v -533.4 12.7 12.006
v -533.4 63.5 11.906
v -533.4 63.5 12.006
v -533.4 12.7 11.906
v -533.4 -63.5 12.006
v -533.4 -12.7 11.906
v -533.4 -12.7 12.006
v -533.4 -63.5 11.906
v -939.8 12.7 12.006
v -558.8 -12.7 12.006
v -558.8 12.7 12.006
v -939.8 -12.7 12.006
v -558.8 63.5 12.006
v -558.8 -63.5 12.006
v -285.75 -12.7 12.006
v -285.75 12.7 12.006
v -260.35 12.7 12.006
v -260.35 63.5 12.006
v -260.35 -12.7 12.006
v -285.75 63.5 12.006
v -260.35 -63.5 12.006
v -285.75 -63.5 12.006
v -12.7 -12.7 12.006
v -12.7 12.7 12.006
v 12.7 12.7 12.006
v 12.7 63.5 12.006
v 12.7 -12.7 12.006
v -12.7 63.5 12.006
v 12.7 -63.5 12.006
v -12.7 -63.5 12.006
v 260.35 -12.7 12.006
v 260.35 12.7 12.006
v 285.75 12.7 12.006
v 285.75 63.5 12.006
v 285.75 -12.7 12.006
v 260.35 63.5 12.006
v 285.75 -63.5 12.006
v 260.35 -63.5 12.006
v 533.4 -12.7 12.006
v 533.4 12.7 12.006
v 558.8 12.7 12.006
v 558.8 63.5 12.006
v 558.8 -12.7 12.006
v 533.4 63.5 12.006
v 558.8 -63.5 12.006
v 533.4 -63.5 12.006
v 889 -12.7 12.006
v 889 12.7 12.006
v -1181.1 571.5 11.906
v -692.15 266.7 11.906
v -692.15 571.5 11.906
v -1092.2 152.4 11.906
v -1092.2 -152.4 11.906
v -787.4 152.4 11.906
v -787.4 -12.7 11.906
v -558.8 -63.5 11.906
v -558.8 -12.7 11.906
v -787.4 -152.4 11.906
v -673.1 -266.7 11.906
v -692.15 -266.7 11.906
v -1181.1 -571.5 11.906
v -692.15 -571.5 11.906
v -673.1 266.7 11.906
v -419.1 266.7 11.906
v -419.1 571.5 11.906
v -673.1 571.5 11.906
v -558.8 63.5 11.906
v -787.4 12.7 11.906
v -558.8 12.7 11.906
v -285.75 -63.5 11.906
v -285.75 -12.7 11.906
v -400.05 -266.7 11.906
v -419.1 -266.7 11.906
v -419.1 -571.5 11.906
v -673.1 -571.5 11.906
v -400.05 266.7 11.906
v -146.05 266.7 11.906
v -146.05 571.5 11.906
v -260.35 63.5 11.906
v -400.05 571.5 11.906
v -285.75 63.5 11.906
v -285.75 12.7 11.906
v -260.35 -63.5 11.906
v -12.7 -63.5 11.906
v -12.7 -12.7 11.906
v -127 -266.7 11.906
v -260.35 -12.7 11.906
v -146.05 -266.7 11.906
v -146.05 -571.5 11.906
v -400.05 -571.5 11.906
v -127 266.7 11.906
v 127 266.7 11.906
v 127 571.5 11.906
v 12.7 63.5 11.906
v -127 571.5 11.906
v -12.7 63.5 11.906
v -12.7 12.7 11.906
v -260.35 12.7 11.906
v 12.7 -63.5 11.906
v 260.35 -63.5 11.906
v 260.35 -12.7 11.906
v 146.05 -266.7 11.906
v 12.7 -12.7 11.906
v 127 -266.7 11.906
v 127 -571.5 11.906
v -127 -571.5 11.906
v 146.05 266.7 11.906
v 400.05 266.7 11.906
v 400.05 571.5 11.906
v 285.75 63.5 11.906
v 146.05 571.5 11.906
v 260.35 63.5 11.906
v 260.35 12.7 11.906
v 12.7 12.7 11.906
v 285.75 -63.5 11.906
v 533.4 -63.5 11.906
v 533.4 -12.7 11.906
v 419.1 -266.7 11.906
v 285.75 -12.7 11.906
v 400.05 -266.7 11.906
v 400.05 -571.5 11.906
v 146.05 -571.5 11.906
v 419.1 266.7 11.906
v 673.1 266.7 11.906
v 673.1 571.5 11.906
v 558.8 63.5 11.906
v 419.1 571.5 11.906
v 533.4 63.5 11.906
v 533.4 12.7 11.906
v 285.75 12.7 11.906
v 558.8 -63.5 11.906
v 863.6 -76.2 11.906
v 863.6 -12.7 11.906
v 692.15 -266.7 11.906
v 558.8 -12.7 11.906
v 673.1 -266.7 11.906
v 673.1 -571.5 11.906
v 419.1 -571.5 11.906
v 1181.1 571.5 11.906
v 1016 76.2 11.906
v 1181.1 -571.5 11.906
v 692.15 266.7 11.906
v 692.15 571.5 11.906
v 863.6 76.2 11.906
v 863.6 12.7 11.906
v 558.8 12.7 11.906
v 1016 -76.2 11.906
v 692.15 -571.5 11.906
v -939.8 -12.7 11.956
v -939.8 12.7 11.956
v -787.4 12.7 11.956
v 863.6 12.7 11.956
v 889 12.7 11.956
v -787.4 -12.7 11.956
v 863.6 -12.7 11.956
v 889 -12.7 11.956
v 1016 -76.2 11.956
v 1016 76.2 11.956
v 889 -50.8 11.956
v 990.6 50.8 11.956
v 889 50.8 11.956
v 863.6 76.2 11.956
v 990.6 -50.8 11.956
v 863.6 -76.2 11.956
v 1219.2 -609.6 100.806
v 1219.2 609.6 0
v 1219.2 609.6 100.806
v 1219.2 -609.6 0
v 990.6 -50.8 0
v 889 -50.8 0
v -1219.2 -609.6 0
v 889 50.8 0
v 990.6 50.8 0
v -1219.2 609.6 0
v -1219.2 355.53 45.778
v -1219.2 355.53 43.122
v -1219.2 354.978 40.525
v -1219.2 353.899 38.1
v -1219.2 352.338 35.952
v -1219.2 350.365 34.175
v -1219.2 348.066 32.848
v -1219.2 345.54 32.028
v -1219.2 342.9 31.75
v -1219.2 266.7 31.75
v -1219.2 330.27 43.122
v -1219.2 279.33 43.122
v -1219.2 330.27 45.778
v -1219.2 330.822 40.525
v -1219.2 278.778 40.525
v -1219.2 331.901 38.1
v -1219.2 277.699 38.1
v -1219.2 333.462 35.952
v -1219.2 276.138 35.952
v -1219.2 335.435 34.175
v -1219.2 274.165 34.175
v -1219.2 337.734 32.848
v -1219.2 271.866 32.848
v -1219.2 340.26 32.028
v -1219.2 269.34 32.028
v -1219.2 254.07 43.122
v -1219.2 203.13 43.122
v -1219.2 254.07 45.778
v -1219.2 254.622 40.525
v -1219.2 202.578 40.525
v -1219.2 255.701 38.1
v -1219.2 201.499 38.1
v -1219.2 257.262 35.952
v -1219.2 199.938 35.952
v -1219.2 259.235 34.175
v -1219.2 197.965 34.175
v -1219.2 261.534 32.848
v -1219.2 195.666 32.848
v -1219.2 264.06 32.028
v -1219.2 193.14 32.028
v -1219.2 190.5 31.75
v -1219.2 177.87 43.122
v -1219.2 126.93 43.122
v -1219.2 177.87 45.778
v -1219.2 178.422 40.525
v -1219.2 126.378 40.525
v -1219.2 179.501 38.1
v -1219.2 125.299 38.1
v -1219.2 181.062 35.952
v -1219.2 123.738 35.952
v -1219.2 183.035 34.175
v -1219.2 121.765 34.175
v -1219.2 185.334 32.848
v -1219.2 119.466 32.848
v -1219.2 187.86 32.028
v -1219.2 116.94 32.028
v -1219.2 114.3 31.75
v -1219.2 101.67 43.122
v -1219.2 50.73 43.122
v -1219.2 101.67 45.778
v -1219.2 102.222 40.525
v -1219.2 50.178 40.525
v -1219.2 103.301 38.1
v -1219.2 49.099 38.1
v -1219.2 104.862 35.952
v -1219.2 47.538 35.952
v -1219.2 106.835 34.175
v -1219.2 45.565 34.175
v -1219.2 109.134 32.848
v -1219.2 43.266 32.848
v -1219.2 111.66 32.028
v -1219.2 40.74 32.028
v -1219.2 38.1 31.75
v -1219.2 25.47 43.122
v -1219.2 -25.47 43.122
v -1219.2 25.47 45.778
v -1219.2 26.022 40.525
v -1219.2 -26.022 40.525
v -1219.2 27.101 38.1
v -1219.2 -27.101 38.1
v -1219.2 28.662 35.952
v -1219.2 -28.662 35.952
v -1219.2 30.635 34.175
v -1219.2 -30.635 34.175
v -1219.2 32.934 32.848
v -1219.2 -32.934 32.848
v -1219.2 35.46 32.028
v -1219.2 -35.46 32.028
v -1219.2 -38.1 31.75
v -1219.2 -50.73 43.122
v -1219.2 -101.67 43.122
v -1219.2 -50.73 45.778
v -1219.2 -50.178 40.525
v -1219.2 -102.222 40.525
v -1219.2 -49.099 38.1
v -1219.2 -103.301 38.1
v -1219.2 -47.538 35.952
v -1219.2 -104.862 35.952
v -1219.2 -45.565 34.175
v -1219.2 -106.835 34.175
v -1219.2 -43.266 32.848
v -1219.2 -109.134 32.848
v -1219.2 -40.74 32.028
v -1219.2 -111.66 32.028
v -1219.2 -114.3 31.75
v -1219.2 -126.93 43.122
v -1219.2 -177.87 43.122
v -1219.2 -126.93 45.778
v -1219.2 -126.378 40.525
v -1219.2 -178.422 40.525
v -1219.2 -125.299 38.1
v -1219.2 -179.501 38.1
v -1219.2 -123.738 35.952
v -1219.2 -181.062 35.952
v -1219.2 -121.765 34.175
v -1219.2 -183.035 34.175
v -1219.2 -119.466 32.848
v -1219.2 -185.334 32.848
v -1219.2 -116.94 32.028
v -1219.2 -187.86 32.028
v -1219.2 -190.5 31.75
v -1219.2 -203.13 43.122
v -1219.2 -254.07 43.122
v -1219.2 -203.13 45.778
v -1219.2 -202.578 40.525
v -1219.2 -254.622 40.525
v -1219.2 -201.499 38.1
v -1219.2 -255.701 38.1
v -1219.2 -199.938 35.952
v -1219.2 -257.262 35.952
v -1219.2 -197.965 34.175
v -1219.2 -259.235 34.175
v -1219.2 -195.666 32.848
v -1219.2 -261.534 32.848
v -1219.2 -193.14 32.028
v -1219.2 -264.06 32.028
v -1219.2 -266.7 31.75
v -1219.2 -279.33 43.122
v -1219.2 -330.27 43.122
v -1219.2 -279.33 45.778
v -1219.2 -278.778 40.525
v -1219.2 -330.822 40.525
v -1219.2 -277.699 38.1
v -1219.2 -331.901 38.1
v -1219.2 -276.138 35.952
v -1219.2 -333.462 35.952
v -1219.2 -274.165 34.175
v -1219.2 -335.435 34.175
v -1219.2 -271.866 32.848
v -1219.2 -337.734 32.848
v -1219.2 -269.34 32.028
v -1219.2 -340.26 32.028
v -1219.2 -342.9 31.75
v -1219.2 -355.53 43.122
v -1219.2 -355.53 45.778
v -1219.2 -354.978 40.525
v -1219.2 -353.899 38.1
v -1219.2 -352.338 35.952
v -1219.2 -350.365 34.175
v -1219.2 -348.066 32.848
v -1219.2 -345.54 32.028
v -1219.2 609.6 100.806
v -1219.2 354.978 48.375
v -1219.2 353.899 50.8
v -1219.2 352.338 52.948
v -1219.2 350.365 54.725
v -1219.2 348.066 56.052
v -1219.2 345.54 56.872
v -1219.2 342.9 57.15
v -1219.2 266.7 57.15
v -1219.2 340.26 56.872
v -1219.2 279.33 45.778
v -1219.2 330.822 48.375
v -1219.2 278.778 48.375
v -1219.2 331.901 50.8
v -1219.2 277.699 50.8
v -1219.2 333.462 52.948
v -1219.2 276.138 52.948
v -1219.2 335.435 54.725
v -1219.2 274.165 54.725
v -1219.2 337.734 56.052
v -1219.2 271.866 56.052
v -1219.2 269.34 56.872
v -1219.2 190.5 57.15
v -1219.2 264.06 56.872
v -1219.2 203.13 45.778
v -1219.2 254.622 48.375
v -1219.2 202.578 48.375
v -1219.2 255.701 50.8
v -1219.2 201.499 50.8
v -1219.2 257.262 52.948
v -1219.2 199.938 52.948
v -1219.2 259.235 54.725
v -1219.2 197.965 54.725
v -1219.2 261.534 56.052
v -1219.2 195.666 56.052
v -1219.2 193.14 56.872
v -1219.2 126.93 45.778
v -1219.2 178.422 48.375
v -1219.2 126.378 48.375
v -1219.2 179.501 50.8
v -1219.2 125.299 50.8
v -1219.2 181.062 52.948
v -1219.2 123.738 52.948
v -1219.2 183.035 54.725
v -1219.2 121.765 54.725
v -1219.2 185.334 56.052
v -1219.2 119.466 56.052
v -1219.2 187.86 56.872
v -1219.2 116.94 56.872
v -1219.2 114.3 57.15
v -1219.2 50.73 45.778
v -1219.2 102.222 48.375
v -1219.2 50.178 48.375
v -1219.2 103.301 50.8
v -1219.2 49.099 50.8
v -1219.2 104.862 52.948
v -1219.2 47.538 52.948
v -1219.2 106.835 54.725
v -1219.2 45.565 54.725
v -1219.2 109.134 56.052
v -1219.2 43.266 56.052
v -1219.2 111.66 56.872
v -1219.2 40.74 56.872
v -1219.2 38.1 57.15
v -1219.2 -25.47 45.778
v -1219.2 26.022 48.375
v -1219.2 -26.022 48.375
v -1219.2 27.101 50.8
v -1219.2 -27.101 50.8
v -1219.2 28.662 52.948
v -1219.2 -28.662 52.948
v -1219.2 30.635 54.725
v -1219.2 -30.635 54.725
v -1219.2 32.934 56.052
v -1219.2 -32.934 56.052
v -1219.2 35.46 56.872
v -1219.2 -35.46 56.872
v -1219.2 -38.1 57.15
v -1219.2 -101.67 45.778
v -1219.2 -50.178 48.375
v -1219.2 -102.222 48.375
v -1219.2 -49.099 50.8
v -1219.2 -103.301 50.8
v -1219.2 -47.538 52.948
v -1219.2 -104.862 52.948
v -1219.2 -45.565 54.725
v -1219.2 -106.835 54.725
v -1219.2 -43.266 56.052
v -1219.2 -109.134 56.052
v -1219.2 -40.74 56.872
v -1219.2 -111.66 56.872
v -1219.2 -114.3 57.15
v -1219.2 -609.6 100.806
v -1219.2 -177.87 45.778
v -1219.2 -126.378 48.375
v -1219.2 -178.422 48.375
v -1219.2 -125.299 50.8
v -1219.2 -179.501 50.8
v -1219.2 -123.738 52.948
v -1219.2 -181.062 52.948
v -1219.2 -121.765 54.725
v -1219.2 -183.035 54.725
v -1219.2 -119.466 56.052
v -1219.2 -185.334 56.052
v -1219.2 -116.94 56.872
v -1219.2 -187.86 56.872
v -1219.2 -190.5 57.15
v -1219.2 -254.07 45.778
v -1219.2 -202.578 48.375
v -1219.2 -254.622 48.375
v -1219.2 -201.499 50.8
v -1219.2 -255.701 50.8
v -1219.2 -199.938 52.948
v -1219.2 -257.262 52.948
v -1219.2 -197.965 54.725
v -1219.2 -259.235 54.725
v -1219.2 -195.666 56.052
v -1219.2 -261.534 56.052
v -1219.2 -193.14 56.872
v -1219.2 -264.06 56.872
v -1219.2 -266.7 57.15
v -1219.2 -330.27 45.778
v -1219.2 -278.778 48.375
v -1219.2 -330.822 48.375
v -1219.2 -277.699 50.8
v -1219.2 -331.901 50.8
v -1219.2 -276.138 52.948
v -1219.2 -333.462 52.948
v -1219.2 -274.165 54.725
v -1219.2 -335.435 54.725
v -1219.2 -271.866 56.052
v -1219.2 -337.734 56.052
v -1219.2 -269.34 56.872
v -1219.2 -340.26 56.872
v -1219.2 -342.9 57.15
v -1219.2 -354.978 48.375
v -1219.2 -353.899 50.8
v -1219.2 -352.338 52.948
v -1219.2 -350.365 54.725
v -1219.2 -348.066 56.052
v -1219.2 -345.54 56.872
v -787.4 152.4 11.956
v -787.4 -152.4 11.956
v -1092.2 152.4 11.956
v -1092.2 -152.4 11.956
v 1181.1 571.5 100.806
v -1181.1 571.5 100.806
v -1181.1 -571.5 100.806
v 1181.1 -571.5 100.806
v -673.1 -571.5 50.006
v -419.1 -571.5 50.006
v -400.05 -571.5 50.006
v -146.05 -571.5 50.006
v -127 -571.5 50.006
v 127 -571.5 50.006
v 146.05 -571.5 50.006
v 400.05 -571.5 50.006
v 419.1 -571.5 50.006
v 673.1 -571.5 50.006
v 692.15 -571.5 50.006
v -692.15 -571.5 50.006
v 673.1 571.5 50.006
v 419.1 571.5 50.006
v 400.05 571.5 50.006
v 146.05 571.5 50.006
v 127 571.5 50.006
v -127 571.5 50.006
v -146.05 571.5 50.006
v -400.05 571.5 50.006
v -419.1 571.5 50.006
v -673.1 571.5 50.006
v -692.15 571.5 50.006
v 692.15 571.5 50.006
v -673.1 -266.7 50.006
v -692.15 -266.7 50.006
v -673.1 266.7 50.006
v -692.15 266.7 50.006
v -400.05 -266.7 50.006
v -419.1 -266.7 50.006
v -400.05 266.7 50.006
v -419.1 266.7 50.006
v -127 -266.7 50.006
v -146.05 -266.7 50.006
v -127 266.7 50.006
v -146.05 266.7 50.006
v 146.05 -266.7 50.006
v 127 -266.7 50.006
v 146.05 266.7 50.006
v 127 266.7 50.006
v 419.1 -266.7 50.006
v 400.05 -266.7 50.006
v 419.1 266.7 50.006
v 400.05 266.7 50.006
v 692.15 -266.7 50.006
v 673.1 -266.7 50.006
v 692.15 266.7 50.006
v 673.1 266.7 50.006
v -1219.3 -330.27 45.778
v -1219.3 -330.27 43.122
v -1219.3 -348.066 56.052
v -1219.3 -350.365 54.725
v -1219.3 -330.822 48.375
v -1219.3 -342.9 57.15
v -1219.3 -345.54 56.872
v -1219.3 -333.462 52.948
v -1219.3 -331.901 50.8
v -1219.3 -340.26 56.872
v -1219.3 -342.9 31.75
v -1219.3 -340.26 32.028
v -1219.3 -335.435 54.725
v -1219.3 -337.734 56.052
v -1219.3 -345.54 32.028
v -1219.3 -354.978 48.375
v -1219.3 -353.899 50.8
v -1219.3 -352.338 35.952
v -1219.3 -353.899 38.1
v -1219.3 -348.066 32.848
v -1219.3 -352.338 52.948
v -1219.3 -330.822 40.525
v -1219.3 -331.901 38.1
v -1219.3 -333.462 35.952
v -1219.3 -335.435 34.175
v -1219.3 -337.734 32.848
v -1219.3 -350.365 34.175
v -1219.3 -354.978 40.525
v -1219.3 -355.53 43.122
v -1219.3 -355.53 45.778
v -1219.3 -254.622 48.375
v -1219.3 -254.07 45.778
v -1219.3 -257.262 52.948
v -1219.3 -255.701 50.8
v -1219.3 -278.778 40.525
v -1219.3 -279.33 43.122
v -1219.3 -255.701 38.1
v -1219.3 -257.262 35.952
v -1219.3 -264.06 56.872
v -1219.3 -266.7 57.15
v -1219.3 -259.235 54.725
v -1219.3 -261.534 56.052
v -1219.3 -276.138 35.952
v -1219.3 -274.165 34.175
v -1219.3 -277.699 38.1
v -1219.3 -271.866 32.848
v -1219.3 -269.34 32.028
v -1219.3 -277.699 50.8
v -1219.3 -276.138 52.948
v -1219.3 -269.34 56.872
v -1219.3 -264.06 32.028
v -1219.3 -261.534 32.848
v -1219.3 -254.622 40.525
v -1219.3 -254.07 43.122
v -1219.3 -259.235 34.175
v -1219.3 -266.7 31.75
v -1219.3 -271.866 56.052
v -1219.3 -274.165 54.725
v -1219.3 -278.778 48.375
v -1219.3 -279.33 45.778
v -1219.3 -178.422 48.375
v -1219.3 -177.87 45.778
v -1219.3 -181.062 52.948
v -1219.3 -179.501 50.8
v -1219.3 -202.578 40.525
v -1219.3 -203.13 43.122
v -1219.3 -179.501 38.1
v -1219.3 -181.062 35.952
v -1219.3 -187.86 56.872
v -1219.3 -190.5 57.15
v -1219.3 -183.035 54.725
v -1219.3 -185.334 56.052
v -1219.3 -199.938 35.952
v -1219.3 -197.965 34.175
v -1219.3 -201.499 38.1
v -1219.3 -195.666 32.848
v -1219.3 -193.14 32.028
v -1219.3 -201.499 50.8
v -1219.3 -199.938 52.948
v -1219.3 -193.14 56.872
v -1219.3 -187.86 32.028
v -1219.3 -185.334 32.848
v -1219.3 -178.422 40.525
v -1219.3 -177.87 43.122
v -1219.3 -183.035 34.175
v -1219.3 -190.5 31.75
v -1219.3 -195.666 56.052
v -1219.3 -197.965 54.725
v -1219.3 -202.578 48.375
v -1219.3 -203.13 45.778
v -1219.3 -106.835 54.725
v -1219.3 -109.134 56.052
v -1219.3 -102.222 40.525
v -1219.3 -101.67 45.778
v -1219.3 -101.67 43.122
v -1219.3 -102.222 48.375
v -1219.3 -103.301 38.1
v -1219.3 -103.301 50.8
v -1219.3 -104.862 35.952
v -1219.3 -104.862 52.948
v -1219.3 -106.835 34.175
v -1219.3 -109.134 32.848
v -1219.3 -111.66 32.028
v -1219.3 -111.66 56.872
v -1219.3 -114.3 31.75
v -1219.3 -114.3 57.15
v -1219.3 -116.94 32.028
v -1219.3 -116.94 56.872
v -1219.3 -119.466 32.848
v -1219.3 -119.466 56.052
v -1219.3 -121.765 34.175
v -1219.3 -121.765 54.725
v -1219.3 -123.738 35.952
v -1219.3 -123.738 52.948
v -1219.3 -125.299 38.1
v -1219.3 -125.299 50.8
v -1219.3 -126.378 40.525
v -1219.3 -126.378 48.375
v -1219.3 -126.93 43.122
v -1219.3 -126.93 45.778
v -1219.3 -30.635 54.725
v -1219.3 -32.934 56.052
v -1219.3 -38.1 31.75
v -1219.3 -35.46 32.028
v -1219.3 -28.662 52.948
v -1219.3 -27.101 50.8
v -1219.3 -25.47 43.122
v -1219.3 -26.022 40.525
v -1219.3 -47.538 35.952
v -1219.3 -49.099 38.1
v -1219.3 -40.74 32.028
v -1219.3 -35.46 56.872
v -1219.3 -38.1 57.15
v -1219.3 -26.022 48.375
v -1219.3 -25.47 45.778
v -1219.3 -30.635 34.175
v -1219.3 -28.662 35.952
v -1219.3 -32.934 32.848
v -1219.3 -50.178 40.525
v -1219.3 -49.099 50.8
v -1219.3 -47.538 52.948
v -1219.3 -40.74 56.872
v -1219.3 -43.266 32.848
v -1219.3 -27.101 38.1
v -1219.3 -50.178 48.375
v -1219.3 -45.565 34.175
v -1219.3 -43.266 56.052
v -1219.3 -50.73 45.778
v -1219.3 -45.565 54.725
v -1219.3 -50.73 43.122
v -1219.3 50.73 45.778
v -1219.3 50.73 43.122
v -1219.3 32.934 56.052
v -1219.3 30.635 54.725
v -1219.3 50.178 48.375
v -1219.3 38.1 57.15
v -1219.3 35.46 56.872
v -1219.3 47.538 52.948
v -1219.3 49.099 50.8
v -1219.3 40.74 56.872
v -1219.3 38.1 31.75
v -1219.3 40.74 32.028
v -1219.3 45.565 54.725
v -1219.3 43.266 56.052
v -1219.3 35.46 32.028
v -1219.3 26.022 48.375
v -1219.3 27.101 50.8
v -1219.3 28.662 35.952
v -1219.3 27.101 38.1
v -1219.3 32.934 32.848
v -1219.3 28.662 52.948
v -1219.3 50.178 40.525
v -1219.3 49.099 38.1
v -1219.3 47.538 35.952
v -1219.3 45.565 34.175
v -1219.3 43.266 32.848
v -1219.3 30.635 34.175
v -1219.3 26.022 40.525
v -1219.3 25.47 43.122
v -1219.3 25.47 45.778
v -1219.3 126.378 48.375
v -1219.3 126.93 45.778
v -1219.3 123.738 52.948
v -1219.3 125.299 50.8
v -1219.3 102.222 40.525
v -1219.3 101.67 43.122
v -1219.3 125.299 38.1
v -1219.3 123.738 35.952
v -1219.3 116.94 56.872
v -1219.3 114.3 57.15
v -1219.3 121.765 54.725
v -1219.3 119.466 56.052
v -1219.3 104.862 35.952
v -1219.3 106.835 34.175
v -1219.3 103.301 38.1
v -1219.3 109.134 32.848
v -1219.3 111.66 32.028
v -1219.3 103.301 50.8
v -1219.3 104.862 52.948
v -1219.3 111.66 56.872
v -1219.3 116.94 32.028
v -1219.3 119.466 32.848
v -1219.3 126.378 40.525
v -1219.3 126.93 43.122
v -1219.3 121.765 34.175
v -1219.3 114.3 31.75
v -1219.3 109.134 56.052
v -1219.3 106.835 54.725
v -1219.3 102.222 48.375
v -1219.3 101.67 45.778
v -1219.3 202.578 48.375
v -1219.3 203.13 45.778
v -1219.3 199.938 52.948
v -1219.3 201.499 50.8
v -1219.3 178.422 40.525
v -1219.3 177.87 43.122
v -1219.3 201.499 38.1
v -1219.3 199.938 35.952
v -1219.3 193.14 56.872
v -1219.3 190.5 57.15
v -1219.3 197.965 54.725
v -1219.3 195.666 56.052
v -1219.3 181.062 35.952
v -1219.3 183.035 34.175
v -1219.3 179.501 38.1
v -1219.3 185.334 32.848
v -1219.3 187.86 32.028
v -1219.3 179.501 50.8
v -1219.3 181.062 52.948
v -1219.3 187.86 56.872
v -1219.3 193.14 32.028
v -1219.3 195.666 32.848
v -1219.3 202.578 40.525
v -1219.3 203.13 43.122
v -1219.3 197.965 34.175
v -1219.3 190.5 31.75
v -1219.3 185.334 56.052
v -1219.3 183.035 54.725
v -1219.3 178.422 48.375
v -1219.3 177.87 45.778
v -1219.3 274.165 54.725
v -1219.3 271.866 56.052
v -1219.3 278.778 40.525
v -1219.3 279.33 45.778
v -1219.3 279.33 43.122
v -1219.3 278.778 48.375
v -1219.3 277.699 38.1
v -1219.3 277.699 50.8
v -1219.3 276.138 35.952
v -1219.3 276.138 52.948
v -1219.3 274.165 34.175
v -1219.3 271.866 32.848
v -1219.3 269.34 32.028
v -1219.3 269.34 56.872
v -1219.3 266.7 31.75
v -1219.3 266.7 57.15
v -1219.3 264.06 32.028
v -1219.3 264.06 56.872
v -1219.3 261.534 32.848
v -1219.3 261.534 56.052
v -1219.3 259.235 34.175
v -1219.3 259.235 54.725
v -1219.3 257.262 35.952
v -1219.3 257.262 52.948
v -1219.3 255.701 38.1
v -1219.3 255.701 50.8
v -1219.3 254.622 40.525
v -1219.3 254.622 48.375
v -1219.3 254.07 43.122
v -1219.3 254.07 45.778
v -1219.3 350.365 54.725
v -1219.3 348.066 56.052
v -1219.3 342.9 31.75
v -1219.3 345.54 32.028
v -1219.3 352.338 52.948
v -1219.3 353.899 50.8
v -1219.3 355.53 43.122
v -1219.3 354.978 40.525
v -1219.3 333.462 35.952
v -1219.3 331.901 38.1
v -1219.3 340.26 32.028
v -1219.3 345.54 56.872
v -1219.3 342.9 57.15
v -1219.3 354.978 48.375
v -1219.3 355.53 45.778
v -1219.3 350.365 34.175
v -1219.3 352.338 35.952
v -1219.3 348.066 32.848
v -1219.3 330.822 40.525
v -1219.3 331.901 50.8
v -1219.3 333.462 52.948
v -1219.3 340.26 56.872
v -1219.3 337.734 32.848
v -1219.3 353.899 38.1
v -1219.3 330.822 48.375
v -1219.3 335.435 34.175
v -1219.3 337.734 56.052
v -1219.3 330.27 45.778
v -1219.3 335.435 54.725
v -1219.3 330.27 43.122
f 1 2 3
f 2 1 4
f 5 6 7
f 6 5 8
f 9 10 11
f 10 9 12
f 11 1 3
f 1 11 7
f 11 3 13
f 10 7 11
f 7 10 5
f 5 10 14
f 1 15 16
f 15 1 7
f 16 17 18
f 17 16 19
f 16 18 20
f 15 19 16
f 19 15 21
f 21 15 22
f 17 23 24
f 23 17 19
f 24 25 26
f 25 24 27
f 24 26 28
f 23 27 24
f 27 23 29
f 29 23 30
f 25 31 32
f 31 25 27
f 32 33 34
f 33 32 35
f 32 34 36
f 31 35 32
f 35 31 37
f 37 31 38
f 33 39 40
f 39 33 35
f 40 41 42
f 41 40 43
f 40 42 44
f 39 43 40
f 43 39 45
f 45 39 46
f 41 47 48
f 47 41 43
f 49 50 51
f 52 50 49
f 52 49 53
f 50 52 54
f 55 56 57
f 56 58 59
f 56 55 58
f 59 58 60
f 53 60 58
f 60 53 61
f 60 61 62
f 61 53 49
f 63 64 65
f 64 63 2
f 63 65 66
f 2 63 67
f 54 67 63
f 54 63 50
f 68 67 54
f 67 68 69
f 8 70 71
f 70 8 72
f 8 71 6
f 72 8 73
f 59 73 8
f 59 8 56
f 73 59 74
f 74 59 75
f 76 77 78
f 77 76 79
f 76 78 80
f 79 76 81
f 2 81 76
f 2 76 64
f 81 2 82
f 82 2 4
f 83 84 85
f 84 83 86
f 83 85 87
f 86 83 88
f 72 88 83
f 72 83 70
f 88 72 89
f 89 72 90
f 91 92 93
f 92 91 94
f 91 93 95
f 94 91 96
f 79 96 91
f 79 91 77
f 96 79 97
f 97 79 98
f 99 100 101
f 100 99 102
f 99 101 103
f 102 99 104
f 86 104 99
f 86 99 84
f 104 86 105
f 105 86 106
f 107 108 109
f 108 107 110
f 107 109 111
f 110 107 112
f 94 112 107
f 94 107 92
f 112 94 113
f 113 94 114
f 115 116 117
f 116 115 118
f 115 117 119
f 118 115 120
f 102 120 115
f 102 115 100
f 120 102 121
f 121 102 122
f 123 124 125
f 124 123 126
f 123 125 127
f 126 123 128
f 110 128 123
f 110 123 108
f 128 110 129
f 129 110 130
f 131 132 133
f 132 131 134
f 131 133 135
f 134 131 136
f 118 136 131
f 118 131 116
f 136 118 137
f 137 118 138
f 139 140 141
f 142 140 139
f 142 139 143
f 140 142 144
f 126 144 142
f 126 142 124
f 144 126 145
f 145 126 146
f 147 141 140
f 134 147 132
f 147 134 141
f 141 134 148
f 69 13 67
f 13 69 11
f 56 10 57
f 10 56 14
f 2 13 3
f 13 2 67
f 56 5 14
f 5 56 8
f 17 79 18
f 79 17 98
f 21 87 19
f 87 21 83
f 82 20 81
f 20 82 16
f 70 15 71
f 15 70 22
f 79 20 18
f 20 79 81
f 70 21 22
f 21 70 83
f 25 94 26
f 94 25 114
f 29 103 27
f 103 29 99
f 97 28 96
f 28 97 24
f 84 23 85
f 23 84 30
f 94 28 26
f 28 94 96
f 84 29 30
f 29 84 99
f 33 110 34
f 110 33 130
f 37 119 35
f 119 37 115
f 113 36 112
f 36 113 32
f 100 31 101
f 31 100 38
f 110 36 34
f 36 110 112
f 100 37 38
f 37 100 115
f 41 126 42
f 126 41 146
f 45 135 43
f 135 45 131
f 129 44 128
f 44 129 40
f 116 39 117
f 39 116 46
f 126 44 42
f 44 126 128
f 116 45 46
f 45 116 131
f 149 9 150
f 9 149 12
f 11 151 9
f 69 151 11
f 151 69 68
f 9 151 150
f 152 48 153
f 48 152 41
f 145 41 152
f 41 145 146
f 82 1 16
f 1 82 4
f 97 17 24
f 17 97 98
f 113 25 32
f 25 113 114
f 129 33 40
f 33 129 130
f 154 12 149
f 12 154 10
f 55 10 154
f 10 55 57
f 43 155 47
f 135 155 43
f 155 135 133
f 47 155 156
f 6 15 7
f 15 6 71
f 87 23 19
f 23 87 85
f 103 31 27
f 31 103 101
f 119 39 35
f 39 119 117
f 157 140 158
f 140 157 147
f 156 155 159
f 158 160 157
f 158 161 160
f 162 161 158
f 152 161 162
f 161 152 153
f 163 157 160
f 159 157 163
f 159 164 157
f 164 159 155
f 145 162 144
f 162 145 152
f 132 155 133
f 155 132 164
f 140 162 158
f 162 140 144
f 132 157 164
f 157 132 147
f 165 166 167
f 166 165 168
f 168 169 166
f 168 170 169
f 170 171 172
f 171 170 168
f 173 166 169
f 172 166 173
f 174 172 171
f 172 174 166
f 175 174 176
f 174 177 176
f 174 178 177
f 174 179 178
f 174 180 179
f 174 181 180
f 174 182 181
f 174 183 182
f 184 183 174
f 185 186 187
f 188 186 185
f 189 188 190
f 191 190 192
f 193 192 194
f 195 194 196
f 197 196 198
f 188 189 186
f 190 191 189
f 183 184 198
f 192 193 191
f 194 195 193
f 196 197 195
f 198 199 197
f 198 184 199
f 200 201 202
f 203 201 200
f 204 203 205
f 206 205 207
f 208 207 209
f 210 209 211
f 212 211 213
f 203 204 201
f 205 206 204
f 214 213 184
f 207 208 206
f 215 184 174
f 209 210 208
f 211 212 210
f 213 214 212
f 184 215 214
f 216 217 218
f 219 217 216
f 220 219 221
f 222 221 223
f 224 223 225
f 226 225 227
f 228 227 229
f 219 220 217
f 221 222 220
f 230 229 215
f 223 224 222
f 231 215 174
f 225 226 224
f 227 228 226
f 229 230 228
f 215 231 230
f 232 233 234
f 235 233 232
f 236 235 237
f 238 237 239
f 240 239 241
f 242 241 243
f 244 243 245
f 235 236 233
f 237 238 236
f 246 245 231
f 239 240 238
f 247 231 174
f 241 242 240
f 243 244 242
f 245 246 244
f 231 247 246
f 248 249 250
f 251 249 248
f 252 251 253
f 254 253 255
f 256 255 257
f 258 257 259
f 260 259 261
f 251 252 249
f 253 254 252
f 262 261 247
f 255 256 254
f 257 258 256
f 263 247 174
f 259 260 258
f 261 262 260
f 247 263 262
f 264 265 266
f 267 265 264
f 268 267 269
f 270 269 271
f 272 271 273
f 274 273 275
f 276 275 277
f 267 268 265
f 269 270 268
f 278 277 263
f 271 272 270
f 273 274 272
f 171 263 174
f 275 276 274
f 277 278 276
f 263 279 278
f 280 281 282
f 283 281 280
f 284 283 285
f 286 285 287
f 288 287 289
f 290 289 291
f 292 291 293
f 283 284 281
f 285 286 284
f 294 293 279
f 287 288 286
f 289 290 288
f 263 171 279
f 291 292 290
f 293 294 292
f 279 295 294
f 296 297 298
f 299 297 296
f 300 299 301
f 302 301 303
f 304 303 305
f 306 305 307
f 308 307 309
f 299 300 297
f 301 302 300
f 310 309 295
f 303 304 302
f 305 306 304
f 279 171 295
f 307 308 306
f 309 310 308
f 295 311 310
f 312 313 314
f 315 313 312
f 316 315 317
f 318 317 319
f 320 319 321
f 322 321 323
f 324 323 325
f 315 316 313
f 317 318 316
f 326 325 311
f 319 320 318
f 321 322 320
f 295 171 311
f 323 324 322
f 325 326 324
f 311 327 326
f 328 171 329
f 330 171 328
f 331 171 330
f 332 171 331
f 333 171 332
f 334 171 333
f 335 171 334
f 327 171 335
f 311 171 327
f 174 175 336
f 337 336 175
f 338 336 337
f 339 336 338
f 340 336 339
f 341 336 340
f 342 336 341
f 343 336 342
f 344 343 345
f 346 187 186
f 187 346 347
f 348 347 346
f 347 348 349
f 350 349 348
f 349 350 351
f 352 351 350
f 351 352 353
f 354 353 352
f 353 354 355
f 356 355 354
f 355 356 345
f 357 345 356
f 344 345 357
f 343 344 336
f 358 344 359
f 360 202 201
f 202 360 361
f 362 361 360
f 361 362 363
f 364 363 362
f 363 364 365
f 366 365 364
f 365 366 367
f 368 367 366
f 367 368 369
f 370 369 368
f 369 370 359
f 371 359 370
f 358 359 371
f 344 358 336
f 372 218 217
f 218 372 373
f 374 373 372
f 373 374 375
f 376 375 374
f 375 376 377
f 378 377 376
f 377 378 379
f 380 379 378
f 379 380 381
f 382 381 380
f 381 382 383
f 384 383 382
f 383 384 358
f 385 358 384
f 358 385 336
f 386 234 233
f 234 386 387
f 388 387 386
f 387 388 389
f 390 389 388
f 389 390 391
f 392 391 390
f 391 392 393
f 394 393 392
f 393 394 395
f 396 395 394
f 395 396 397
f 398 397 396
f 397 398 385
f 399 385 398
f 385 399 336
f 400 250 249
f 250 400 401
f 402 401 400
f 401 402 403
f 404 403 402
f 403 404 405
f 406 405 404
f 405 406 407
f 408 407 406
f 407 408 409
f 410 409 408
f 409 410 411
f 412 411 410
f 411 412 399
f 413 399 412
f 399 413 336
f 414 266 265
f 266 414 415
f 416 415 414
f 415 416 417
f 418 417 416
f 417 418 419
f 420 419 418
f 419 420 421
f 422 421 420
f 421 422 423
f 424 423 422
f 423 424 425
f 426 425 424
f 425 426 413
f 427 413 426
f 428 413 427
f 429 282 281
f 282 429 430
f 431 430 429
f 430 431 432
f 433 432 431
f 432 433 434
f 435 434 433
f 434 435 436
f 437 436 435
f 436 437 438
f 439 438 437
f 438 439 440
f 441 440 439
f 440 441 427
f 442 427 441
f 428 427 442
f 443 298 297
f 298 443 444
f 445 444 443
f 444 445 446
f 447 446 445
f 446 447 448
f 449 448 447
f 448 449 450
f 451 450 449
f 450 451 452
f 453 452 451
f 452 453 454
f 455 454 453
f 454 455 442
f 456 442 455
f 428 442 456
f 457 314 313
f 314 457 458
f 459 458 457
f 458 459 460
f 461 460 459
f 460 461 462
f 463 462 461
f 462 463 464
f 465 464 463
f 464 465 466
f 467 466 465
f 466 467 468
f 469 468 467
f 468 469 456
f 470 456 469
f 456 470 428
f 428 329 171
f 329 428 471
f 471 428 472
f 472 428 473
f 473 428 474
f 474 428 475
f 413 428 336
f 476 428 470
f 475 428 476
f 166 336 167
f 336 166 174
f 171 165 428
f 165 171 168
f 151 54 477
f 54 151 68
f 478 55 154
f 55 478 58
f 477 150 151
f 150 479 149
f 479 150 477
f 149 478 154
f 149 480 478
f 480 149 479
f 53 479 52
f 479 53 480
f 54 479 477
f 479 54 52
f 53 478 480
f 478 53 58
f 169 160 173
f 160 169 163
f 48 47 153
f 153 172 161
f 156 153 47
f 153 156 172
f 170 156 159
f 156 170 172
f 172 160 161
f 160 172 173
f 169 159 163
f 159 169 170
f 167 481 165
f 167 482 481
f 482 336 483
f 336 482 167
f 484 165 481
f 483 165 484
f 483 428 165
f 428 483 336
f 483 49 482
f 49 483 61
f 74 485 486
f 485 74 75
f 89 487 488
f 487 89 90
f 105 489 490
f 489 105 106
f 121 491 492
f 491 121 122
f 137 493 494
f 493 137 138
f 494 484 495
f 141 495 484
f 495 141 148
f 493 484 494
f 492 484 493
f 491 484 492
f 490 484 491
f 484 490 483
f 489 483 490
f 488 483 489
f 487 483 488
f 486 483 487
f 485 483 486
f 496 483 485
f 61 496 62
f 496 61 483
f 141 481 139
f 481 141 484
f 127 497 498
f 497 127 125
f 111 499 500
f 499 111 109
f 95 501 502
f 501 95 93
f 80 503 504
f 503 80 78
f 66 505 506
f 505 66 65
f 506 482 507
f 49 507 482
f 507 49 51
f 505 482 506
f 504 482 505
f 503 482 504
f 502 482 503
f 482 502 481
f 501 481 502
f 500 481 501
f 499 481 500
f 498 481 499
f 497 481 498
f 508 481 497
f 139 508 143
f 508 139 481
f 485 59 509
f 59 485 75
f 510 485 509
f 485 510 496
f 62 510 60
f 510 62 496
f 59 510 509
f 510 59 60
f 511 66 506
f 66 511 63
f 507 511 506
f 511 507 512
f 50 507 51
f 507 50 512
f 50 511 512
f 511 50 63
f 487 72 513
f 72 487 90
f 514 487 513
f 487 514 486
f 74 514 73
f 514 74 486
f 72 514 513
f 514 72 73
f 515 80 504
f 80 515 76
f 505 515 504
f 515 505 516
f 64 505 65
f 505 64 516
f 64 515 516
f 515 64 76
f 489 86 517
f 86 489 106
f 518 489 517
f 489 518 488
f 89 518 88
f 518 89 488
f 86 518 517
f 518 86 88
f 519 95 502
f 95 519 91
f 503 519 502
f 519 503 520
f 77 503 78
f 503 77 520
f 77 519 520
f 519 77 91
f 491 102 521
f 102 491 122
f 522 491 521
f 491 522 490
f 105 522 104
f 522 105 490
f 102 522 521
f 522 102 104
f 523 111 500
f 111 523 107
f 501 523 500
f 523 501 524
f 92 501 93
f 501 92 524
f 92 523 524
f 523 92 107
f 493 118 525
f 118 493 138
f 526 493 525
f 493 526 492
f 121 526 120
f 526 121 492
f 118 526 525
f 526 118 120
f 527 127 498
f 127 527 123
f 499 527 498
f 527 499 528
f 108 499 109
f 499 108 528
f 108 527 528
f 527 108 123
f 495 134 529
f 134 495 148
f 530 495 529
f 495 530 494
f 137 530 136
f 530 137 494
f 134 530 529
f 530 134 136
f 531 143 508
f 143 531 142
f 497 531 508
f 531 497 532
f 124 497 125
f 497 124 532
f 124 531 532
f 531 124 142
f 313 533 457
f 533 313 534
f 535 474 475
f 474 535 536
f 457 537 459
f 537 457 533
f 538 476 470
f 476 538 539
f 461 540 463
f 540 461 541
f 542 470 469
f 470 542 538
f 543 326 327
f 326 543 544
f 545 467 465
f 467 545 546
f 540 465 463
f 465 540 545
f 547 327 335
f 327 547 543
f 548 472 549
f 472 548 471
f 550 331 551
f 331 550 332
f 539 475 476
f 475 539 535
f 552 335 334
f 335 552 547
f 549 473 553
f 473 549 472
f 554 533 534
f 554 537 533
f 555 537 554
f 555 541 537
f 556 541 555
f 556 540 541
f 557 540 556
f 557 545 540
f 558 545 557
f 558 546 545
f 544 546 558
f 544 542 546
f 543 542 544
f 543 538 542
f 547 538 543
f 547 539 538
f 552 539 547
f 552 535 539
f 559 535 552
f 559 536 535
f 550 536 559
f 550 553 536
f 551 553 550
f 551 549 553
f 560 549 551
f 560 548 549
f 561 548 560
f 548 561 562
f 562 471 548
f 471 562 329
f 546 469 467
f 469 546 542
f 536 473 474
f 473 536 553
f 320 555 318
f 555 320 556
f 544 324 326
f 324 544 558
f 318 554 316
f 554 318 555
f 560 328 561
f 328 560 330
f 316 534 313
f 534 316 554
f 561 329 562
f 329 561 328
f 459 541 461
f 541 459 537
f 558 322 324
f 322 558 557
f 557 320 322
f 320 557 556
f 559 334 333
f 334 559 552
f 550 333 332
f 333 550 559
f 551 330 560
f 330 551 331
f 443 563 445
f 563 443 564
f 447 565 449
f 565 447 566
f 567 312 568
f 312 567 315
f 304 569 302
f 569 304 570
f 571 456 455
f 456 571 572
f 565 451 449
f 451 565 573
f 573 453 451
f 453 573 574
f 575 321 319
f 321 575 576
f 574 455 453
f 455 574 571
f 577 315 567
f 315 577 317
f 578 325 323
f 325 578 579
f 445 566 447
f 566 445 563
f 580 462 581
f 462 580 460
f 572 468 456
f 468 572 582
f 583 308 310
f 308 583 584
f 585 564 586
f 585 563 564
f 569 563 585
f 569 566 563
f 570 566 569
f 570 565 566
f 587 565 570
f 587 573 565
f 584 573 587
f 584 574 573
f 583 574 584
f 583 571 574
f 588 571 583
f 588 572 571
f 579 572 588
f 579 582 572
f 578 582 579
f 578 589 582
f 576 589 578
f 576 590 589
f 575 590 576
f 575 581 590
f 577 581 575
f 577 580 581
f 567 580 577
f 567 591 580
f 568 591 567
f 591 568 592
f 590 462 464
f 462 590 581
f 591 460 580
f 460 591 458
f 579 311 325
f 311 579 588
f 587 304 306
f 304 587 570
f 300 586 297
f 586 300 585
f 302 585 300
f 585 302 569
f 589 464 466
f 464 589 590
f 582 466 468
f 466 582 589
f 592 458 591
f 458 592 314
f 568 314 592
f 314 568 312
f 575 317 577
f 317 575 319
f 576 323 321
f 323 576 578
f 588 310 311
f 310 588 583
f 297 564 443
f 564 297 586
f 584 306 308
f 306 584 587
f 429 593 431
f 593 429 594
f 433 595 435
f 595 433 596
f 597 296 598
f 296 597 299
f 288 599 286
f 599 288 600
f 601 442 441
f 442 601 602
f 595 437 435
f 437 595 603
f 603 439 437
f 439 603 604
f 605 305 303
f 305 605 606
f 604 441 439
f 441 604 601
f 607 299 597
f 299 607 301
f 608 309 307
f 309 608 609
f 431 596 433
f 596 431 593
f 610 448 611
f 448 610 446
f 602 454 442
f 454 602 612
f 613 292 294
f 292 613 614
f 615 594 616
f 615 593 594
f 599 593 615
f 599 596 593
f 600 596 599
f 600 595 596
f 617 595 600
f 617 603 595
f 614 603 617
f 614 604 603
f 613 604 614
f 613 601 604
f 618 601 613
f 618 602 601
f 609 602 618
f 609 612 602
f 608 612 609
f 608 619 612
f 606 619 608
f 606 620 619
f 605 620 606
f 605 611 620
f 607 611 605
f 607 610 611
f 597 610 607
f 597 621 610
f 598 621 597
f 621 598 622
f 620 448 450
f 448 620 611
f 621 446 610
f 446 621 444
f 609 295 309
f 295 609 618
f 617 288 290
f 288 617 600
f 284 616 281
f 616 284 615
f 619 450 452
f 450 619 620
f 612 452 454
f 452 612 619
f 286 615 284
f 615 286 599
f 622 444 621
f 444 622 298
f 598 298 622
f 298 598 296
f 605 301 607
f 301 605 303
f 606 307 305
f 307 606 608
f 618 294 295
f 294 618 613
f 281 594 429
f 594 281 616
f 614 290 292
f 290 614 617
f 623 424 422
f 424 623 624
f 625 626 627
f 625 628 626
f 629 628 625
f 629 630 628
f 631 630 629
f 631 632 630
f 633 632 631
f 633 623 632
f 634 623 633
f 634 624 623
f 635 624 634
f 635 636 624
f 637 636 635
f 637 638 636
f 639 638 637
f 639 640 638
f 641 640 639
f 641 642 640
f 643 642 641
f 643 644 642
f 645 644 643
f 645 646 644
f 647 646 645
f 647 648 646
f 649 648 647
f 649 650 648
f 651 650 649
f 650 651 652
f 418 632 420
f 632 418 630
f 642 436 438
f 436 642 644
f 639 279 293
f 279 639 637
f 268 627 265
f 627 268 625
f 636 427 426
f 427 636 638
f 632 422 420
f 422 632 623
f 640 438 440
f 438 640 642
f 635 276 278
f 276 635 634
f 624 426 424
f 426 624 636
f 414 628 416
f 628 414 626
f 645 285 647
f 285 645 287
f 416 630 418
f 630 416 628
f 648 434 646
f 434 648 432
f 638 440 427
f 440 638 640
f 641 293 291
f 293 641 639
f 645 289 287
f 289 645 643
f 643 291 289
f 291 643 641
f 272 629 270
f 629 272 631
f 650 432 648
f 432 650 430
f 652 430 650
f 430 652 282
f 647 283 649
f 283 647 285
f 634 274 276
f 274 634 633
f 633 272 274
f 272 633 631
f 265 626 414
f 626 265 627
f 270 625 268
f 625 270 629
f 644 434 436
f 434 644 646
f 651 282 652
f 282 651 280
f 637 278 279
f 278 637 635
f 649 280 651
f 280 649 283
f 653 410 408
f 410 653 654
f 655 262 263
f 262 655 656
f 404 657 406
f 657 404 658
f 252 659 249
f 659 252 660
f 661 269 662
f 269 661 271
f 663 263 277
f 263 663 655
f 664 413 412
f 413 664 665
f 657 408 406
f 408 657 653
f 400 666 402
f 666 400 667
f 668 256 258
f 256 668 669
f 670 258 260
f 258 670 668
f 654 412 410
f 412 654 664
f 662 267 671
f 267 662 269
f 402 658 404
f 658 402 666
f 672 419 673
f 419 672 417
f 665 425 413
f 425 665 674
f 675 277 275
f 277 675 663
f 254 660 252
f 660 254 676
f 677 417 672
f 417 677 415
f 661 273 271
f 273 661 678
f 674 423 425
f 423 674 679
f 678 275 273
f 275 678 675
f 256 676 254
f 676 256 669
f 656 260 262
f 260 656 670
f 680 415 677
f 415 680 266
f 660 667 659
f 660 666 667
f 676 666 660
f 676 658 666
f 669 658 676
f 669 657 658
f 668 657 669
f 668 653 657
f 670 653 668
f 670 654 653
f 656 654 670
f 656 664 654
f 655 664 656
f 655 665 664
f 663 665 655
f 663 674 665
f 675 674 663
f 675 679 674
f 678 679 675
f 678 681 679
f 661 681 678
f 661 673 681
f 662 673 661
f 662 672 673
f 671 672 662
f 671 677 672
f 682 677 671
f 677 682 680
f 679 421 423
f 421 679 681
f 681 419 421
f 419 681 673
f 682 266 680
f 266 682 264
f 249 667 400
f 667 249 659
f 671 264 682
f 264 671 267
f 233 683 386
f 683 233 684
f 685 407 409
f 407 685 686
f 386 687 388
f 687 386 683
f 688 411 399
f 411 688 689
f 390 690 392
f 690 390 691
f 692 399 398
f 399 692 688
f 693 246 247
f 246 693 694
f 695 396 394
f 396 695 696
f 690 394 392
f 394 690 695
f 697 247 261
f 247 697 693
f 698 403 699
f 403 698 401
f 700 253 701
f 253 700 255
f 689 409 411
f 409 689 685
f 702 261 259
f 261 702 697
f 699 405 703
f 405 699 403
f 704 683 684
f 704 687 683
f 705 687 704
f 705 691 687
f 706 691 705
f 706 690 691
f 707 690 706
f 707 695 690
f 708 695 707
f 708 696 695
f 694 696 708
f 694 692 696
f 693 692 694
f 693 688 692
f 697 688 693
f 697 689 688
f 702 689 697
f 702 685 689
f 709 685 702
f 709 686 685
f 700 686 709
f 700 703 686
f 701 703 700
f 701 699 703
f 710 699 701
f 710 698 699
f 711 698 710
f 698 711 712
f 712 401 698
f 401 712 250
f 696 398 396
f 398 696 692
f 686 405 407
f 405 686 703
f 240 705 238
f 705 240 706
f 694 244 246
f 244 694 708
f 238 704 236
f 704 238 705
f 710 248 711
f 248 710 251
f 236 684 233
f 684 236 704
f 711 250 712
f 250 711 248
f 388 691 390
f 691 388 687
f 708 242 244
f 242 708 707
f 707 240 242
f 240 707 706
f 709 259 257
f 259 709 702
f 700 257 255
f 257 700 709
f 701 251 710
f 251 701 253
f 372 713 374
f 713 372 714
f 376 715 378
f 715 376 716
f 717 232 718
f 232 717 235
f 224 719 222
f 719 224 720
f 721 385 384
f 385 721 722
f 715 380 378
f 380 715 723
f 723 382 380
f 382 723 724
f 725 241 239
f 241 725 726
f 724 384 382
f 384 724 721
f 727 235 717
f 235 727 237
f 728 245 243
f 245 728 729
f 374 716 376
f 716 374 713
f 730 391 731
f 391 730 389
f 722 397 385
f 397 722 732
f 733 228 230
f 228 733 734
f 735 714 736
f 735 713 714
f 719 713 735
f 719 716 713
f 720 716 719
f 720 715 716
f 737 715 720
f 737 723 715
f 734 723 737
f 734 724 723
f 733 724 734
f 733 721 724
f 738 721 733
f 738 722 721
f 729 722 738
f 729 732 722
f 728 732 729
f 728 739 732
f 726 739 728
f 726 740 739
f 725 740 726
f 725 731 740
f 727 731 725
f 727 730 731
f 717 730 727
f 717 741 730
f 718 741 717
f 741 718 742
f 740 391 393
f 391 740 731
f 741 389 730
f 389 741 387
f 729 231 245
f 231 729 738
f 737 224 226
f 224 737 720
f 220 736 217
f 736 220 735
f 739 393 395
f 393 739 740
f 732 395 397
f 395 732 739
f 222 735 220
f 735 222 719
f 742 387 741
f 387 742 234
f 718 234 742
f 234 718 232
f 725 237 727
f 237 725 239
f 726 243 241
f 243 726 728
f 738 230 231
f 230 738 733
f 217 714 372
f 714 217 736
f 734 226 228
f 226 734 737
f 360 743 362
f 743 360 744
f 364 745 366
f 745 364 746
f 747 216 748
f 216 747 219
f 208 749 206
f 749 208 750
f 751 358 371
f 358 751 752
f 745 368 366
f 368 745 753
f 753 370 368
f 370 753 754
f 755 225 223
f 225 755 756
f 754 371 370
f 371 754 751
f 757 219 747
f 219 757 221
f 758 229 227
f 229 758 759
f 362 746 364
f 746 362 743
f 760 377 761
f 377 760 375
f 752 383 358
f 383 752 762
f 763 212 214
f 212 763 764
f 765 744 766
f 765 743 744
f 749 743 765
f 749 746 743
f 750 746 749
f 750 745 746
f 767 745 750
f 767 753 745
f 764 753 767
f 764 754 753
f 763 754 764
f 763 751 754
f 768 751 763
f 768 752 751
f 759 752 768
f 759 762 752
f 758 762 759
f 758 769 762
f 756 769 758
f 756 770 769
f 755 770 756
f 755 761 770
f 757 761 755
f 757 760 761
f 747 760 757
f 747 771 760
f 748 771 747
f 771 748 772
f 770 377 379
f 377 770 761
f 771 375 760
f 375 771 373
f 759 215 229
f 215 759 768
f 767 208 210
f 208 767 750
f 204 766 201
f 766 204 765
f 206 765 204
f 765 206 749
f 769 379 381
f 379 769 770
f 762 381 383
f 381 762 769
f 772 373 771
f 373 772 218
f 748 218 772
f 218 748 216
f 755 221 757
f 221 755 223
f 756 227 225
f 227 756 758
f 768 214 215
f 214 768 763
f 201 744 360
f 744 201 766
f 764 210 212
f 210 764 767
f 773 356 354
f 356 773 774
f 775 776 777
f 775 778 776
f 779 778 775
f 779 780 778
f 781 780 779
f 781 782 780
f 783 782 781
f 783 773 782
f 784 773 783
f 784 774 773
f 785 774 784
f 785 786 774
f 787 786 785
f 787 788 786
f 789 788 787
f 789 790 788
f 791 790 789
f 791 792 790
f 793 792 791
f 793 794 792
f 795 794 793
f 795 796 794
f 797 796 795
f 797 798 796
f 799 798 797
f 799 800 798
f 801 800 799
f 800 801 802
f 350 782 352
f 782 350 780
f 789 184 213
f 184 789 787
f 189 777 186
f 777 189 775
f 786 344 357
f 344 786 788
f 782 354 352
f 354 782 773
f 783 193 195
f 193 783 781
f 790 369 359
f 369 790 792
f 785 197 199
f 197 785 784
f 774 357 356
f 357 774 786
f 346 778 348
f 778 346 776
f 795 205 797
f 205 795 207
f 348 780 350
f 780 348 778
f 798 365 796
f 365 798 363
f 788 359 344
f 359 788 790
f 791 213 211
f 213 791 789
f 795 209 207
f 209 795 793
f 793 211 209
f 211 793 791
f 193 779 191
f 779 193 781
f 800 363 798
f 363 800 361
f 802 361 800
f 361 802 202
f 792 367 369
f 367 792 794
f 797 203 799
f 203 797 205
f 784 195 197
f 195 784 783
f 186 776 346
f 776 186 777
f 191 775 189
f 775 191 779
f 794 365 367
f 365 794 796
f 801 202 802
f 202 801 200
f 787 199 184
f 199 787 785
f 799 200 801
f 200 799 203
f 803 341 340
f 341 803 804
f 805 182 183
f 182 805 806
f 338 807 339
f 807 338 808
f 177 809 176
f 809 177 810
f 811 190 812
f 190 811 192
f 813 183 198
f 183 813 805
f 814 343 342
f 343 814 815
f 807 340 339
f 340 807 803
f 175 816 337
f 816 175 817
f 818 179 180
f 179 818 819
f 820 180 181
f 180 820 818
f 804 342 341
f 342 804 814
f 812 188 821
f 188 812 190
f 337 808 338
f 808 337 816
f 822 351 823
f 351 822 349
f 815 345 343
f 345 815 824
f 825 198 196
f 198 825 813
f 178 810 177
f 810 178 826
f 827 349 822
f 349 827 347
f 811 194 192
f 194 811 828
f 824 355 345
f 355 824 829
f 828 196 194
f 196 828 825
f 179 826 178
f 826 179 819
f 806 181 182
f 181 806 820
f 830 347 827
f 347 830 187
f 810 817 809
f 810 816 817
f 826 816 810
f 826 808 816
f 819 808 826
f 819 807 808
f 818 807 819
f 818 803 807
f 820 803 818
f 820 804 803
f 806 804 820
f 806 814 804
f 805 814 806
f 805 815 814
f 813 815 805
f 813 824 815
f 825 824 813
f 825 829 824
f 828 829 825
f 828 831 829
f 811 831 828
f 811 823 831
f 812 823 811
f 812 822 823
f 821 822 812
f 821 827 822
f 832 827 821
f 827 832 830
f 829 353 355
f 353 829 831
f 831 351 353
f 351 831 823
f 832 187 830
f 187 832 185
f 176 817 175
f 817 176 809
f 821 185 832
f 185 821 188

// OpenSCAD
// ****************************************************************
// 2020 IEEE SoutheastCon Hardware Competition
// Pi-Day competition
// ****************************************************************

// Conversion factors
inch  = 25.4; // mm to inch conversion
fudge = 0.1;  // mm for z-fighting

// Standard lumber dimensions
by1 = 0.75*inch;
by2 = 1.5*inch;
by4 = 3.5*inch;
halfInchPly = 15/32*inch; // nominal 0.5"

// Arena drawFloor dimensions
arenaX = 8*12*inch;
arenaY = 4*12*inch;
arenaZ = halfInchPly;

// Arena colors
floor_color  = "black";
wall_color   = "yellow";
stripe_color = "white";
button_color = "red";

stripeWidth = 1*inch;
markerWidth = 5*inch;

// Starting square and tower hole dimensions
startSquare = 12*inch;
startCenterOffset = by2 + 9.5*inch;
holeSize    = 4*inch;
holeCenterOffset = arenaX - by2 - 9.5*inch;

binWidth = 10*inch;
binDepth = 12*inch;
bin1Xoffset = arenaX/2 - (2.5*binWidth) - 3*by1;

buttonSpacing = 3*inch;



// ****************************************************************
// Draw the center line and the bin navigation marker lines
// ****************************************************************

module drawFloorLines()
{
    color(stripe_color) {

        // Stripe down the middle of the bins
        translate([startCenterOffset, (arenaY-stripeWidth)/2, arenaZ])
           cube([holeCenterOffset - startCenterOffset, stripeWidth, fudge]);

        // Draw the alignment markers for each bin on middle line
        for(bin=[0:4]) {
           translate([bin1Xoffset + 
                     (bin+1)*by1 + 
                     (bin+0.5)*binWidth -
                     stripeWidth/2,
                     (arenaY-markerWidth)/2, arenaZ])
              cube([stripeWidth, markerWidth, fudge]);
        }

        // Draw the square around the tower hole
        translate([holeCenterOffset,arenaY/2,arenaZ])
           cube([holeSize+2*stripeWidth,
                 holeSize+2*stripeWidth,
                 fudge], center=true);

    }
}


// ****************************************************************
// Draw the starting square
// ****************************************************************

module drawStartingSquare()
{
    color(stripe_color) 
        translate([startCenterOffset, arenaY/2, arenaZ])
        cube([startSquare, startSquare, fudge], center=true);
}


// ****************************************************************
// Draw the floor of the arena (4' x 8' black plywood), with a hole
//    cut out of it on end for the stacking tower (teams are 
//    responsible for providing their own stacking surface to 
//    place within the hold to isolate it from the vibrations of
//    the arena floor)
// ****************************************************************

module drawFloor()
{
    difference() {
       union() {
           // First draw the plywood floor
           color(floor_color) 
               cube([arenaX, arenaY, arenaZ]);
           drawFloorLines();
           drawStartingSquare();
       }

       // Then cut a hole out of the middle of it
       translate([holeCenterOffset,arenaY/2,-fudge])
          cube([holeSize,holeSize,(arenaZ+fudge)*3], center=true);
    }
}


// ****************************************************************
// Draw the 2x4 walls
// ****************************************************************

module drawWalls()
{
    color(wall_color) union() {

        // left wall
        translate([by2, 0, arenaZ]) 
           cube([arenaX-by2, by2, by4]);

        // right wall
        translate([0, arenaY-by2, arenaZ]) 
           cube([arenaX-by2, by2, by4]);

        // front wall (nearest tower hole)
        translate([arenaX-by2, by2, arenaZ]) 
           cube([by2, arenaY-by2, by4]);

        // back wall (pushbutton wall)
        translate([0, 0, arenaZ]) 
           cube([by2, arenaY-by2, by4]);
    }
}


// ****************************************************************
// Each bin wall is a 1x2, mounted with the 3/4" side on the plywood
//    and the 1.5" standing vertical - one wall between each bin and
//    since we have 5 bins on each wall, that is 6 walls on each side
// ****************************************************************

module drawBinWalls()
{
    color(wall_color) {

        for(wall=[0:5]) {
           translate([bin1Xoffset + wall*(binWidth+by1), 0, arenaZ]) {
              translate([0, by2, 0])
                 cube([by1,binDepth,by2]);
              translate([0, arenaY - by2 - binDepth, 0])
                 cube([by1,binDepth,by2]);
           }
        }
    }
}



// ****************************************************************
// Draw the pushbuttons
// ****************************************************************

module drawPushbuttons()
{
    for(button=[0:9]) {
        translate([by2, 
                   (button - 4.5) * buttonSpacing + arenaY/2,
                   by4/2])
        rotate([0, -90, 0])
            color(button_color)
               cylinder(r=0.5*inch, h=by2+fudge);
    }
}


// ****************************************************************
// Draw the entire arena by invoking each of the arena drawing modules
// ****************************************************************

module drawArena()
{
    drawFloor();
    drawWalls(); 
    drawBinWalls();
    drawPushbuttons();
}


// ****************************************************************
// Draw the arena, centering it over [0,0,0]
// ****************************************************************

translate([-arenaX/2,-arenaY/2, 0]) 
   drawArena();    
